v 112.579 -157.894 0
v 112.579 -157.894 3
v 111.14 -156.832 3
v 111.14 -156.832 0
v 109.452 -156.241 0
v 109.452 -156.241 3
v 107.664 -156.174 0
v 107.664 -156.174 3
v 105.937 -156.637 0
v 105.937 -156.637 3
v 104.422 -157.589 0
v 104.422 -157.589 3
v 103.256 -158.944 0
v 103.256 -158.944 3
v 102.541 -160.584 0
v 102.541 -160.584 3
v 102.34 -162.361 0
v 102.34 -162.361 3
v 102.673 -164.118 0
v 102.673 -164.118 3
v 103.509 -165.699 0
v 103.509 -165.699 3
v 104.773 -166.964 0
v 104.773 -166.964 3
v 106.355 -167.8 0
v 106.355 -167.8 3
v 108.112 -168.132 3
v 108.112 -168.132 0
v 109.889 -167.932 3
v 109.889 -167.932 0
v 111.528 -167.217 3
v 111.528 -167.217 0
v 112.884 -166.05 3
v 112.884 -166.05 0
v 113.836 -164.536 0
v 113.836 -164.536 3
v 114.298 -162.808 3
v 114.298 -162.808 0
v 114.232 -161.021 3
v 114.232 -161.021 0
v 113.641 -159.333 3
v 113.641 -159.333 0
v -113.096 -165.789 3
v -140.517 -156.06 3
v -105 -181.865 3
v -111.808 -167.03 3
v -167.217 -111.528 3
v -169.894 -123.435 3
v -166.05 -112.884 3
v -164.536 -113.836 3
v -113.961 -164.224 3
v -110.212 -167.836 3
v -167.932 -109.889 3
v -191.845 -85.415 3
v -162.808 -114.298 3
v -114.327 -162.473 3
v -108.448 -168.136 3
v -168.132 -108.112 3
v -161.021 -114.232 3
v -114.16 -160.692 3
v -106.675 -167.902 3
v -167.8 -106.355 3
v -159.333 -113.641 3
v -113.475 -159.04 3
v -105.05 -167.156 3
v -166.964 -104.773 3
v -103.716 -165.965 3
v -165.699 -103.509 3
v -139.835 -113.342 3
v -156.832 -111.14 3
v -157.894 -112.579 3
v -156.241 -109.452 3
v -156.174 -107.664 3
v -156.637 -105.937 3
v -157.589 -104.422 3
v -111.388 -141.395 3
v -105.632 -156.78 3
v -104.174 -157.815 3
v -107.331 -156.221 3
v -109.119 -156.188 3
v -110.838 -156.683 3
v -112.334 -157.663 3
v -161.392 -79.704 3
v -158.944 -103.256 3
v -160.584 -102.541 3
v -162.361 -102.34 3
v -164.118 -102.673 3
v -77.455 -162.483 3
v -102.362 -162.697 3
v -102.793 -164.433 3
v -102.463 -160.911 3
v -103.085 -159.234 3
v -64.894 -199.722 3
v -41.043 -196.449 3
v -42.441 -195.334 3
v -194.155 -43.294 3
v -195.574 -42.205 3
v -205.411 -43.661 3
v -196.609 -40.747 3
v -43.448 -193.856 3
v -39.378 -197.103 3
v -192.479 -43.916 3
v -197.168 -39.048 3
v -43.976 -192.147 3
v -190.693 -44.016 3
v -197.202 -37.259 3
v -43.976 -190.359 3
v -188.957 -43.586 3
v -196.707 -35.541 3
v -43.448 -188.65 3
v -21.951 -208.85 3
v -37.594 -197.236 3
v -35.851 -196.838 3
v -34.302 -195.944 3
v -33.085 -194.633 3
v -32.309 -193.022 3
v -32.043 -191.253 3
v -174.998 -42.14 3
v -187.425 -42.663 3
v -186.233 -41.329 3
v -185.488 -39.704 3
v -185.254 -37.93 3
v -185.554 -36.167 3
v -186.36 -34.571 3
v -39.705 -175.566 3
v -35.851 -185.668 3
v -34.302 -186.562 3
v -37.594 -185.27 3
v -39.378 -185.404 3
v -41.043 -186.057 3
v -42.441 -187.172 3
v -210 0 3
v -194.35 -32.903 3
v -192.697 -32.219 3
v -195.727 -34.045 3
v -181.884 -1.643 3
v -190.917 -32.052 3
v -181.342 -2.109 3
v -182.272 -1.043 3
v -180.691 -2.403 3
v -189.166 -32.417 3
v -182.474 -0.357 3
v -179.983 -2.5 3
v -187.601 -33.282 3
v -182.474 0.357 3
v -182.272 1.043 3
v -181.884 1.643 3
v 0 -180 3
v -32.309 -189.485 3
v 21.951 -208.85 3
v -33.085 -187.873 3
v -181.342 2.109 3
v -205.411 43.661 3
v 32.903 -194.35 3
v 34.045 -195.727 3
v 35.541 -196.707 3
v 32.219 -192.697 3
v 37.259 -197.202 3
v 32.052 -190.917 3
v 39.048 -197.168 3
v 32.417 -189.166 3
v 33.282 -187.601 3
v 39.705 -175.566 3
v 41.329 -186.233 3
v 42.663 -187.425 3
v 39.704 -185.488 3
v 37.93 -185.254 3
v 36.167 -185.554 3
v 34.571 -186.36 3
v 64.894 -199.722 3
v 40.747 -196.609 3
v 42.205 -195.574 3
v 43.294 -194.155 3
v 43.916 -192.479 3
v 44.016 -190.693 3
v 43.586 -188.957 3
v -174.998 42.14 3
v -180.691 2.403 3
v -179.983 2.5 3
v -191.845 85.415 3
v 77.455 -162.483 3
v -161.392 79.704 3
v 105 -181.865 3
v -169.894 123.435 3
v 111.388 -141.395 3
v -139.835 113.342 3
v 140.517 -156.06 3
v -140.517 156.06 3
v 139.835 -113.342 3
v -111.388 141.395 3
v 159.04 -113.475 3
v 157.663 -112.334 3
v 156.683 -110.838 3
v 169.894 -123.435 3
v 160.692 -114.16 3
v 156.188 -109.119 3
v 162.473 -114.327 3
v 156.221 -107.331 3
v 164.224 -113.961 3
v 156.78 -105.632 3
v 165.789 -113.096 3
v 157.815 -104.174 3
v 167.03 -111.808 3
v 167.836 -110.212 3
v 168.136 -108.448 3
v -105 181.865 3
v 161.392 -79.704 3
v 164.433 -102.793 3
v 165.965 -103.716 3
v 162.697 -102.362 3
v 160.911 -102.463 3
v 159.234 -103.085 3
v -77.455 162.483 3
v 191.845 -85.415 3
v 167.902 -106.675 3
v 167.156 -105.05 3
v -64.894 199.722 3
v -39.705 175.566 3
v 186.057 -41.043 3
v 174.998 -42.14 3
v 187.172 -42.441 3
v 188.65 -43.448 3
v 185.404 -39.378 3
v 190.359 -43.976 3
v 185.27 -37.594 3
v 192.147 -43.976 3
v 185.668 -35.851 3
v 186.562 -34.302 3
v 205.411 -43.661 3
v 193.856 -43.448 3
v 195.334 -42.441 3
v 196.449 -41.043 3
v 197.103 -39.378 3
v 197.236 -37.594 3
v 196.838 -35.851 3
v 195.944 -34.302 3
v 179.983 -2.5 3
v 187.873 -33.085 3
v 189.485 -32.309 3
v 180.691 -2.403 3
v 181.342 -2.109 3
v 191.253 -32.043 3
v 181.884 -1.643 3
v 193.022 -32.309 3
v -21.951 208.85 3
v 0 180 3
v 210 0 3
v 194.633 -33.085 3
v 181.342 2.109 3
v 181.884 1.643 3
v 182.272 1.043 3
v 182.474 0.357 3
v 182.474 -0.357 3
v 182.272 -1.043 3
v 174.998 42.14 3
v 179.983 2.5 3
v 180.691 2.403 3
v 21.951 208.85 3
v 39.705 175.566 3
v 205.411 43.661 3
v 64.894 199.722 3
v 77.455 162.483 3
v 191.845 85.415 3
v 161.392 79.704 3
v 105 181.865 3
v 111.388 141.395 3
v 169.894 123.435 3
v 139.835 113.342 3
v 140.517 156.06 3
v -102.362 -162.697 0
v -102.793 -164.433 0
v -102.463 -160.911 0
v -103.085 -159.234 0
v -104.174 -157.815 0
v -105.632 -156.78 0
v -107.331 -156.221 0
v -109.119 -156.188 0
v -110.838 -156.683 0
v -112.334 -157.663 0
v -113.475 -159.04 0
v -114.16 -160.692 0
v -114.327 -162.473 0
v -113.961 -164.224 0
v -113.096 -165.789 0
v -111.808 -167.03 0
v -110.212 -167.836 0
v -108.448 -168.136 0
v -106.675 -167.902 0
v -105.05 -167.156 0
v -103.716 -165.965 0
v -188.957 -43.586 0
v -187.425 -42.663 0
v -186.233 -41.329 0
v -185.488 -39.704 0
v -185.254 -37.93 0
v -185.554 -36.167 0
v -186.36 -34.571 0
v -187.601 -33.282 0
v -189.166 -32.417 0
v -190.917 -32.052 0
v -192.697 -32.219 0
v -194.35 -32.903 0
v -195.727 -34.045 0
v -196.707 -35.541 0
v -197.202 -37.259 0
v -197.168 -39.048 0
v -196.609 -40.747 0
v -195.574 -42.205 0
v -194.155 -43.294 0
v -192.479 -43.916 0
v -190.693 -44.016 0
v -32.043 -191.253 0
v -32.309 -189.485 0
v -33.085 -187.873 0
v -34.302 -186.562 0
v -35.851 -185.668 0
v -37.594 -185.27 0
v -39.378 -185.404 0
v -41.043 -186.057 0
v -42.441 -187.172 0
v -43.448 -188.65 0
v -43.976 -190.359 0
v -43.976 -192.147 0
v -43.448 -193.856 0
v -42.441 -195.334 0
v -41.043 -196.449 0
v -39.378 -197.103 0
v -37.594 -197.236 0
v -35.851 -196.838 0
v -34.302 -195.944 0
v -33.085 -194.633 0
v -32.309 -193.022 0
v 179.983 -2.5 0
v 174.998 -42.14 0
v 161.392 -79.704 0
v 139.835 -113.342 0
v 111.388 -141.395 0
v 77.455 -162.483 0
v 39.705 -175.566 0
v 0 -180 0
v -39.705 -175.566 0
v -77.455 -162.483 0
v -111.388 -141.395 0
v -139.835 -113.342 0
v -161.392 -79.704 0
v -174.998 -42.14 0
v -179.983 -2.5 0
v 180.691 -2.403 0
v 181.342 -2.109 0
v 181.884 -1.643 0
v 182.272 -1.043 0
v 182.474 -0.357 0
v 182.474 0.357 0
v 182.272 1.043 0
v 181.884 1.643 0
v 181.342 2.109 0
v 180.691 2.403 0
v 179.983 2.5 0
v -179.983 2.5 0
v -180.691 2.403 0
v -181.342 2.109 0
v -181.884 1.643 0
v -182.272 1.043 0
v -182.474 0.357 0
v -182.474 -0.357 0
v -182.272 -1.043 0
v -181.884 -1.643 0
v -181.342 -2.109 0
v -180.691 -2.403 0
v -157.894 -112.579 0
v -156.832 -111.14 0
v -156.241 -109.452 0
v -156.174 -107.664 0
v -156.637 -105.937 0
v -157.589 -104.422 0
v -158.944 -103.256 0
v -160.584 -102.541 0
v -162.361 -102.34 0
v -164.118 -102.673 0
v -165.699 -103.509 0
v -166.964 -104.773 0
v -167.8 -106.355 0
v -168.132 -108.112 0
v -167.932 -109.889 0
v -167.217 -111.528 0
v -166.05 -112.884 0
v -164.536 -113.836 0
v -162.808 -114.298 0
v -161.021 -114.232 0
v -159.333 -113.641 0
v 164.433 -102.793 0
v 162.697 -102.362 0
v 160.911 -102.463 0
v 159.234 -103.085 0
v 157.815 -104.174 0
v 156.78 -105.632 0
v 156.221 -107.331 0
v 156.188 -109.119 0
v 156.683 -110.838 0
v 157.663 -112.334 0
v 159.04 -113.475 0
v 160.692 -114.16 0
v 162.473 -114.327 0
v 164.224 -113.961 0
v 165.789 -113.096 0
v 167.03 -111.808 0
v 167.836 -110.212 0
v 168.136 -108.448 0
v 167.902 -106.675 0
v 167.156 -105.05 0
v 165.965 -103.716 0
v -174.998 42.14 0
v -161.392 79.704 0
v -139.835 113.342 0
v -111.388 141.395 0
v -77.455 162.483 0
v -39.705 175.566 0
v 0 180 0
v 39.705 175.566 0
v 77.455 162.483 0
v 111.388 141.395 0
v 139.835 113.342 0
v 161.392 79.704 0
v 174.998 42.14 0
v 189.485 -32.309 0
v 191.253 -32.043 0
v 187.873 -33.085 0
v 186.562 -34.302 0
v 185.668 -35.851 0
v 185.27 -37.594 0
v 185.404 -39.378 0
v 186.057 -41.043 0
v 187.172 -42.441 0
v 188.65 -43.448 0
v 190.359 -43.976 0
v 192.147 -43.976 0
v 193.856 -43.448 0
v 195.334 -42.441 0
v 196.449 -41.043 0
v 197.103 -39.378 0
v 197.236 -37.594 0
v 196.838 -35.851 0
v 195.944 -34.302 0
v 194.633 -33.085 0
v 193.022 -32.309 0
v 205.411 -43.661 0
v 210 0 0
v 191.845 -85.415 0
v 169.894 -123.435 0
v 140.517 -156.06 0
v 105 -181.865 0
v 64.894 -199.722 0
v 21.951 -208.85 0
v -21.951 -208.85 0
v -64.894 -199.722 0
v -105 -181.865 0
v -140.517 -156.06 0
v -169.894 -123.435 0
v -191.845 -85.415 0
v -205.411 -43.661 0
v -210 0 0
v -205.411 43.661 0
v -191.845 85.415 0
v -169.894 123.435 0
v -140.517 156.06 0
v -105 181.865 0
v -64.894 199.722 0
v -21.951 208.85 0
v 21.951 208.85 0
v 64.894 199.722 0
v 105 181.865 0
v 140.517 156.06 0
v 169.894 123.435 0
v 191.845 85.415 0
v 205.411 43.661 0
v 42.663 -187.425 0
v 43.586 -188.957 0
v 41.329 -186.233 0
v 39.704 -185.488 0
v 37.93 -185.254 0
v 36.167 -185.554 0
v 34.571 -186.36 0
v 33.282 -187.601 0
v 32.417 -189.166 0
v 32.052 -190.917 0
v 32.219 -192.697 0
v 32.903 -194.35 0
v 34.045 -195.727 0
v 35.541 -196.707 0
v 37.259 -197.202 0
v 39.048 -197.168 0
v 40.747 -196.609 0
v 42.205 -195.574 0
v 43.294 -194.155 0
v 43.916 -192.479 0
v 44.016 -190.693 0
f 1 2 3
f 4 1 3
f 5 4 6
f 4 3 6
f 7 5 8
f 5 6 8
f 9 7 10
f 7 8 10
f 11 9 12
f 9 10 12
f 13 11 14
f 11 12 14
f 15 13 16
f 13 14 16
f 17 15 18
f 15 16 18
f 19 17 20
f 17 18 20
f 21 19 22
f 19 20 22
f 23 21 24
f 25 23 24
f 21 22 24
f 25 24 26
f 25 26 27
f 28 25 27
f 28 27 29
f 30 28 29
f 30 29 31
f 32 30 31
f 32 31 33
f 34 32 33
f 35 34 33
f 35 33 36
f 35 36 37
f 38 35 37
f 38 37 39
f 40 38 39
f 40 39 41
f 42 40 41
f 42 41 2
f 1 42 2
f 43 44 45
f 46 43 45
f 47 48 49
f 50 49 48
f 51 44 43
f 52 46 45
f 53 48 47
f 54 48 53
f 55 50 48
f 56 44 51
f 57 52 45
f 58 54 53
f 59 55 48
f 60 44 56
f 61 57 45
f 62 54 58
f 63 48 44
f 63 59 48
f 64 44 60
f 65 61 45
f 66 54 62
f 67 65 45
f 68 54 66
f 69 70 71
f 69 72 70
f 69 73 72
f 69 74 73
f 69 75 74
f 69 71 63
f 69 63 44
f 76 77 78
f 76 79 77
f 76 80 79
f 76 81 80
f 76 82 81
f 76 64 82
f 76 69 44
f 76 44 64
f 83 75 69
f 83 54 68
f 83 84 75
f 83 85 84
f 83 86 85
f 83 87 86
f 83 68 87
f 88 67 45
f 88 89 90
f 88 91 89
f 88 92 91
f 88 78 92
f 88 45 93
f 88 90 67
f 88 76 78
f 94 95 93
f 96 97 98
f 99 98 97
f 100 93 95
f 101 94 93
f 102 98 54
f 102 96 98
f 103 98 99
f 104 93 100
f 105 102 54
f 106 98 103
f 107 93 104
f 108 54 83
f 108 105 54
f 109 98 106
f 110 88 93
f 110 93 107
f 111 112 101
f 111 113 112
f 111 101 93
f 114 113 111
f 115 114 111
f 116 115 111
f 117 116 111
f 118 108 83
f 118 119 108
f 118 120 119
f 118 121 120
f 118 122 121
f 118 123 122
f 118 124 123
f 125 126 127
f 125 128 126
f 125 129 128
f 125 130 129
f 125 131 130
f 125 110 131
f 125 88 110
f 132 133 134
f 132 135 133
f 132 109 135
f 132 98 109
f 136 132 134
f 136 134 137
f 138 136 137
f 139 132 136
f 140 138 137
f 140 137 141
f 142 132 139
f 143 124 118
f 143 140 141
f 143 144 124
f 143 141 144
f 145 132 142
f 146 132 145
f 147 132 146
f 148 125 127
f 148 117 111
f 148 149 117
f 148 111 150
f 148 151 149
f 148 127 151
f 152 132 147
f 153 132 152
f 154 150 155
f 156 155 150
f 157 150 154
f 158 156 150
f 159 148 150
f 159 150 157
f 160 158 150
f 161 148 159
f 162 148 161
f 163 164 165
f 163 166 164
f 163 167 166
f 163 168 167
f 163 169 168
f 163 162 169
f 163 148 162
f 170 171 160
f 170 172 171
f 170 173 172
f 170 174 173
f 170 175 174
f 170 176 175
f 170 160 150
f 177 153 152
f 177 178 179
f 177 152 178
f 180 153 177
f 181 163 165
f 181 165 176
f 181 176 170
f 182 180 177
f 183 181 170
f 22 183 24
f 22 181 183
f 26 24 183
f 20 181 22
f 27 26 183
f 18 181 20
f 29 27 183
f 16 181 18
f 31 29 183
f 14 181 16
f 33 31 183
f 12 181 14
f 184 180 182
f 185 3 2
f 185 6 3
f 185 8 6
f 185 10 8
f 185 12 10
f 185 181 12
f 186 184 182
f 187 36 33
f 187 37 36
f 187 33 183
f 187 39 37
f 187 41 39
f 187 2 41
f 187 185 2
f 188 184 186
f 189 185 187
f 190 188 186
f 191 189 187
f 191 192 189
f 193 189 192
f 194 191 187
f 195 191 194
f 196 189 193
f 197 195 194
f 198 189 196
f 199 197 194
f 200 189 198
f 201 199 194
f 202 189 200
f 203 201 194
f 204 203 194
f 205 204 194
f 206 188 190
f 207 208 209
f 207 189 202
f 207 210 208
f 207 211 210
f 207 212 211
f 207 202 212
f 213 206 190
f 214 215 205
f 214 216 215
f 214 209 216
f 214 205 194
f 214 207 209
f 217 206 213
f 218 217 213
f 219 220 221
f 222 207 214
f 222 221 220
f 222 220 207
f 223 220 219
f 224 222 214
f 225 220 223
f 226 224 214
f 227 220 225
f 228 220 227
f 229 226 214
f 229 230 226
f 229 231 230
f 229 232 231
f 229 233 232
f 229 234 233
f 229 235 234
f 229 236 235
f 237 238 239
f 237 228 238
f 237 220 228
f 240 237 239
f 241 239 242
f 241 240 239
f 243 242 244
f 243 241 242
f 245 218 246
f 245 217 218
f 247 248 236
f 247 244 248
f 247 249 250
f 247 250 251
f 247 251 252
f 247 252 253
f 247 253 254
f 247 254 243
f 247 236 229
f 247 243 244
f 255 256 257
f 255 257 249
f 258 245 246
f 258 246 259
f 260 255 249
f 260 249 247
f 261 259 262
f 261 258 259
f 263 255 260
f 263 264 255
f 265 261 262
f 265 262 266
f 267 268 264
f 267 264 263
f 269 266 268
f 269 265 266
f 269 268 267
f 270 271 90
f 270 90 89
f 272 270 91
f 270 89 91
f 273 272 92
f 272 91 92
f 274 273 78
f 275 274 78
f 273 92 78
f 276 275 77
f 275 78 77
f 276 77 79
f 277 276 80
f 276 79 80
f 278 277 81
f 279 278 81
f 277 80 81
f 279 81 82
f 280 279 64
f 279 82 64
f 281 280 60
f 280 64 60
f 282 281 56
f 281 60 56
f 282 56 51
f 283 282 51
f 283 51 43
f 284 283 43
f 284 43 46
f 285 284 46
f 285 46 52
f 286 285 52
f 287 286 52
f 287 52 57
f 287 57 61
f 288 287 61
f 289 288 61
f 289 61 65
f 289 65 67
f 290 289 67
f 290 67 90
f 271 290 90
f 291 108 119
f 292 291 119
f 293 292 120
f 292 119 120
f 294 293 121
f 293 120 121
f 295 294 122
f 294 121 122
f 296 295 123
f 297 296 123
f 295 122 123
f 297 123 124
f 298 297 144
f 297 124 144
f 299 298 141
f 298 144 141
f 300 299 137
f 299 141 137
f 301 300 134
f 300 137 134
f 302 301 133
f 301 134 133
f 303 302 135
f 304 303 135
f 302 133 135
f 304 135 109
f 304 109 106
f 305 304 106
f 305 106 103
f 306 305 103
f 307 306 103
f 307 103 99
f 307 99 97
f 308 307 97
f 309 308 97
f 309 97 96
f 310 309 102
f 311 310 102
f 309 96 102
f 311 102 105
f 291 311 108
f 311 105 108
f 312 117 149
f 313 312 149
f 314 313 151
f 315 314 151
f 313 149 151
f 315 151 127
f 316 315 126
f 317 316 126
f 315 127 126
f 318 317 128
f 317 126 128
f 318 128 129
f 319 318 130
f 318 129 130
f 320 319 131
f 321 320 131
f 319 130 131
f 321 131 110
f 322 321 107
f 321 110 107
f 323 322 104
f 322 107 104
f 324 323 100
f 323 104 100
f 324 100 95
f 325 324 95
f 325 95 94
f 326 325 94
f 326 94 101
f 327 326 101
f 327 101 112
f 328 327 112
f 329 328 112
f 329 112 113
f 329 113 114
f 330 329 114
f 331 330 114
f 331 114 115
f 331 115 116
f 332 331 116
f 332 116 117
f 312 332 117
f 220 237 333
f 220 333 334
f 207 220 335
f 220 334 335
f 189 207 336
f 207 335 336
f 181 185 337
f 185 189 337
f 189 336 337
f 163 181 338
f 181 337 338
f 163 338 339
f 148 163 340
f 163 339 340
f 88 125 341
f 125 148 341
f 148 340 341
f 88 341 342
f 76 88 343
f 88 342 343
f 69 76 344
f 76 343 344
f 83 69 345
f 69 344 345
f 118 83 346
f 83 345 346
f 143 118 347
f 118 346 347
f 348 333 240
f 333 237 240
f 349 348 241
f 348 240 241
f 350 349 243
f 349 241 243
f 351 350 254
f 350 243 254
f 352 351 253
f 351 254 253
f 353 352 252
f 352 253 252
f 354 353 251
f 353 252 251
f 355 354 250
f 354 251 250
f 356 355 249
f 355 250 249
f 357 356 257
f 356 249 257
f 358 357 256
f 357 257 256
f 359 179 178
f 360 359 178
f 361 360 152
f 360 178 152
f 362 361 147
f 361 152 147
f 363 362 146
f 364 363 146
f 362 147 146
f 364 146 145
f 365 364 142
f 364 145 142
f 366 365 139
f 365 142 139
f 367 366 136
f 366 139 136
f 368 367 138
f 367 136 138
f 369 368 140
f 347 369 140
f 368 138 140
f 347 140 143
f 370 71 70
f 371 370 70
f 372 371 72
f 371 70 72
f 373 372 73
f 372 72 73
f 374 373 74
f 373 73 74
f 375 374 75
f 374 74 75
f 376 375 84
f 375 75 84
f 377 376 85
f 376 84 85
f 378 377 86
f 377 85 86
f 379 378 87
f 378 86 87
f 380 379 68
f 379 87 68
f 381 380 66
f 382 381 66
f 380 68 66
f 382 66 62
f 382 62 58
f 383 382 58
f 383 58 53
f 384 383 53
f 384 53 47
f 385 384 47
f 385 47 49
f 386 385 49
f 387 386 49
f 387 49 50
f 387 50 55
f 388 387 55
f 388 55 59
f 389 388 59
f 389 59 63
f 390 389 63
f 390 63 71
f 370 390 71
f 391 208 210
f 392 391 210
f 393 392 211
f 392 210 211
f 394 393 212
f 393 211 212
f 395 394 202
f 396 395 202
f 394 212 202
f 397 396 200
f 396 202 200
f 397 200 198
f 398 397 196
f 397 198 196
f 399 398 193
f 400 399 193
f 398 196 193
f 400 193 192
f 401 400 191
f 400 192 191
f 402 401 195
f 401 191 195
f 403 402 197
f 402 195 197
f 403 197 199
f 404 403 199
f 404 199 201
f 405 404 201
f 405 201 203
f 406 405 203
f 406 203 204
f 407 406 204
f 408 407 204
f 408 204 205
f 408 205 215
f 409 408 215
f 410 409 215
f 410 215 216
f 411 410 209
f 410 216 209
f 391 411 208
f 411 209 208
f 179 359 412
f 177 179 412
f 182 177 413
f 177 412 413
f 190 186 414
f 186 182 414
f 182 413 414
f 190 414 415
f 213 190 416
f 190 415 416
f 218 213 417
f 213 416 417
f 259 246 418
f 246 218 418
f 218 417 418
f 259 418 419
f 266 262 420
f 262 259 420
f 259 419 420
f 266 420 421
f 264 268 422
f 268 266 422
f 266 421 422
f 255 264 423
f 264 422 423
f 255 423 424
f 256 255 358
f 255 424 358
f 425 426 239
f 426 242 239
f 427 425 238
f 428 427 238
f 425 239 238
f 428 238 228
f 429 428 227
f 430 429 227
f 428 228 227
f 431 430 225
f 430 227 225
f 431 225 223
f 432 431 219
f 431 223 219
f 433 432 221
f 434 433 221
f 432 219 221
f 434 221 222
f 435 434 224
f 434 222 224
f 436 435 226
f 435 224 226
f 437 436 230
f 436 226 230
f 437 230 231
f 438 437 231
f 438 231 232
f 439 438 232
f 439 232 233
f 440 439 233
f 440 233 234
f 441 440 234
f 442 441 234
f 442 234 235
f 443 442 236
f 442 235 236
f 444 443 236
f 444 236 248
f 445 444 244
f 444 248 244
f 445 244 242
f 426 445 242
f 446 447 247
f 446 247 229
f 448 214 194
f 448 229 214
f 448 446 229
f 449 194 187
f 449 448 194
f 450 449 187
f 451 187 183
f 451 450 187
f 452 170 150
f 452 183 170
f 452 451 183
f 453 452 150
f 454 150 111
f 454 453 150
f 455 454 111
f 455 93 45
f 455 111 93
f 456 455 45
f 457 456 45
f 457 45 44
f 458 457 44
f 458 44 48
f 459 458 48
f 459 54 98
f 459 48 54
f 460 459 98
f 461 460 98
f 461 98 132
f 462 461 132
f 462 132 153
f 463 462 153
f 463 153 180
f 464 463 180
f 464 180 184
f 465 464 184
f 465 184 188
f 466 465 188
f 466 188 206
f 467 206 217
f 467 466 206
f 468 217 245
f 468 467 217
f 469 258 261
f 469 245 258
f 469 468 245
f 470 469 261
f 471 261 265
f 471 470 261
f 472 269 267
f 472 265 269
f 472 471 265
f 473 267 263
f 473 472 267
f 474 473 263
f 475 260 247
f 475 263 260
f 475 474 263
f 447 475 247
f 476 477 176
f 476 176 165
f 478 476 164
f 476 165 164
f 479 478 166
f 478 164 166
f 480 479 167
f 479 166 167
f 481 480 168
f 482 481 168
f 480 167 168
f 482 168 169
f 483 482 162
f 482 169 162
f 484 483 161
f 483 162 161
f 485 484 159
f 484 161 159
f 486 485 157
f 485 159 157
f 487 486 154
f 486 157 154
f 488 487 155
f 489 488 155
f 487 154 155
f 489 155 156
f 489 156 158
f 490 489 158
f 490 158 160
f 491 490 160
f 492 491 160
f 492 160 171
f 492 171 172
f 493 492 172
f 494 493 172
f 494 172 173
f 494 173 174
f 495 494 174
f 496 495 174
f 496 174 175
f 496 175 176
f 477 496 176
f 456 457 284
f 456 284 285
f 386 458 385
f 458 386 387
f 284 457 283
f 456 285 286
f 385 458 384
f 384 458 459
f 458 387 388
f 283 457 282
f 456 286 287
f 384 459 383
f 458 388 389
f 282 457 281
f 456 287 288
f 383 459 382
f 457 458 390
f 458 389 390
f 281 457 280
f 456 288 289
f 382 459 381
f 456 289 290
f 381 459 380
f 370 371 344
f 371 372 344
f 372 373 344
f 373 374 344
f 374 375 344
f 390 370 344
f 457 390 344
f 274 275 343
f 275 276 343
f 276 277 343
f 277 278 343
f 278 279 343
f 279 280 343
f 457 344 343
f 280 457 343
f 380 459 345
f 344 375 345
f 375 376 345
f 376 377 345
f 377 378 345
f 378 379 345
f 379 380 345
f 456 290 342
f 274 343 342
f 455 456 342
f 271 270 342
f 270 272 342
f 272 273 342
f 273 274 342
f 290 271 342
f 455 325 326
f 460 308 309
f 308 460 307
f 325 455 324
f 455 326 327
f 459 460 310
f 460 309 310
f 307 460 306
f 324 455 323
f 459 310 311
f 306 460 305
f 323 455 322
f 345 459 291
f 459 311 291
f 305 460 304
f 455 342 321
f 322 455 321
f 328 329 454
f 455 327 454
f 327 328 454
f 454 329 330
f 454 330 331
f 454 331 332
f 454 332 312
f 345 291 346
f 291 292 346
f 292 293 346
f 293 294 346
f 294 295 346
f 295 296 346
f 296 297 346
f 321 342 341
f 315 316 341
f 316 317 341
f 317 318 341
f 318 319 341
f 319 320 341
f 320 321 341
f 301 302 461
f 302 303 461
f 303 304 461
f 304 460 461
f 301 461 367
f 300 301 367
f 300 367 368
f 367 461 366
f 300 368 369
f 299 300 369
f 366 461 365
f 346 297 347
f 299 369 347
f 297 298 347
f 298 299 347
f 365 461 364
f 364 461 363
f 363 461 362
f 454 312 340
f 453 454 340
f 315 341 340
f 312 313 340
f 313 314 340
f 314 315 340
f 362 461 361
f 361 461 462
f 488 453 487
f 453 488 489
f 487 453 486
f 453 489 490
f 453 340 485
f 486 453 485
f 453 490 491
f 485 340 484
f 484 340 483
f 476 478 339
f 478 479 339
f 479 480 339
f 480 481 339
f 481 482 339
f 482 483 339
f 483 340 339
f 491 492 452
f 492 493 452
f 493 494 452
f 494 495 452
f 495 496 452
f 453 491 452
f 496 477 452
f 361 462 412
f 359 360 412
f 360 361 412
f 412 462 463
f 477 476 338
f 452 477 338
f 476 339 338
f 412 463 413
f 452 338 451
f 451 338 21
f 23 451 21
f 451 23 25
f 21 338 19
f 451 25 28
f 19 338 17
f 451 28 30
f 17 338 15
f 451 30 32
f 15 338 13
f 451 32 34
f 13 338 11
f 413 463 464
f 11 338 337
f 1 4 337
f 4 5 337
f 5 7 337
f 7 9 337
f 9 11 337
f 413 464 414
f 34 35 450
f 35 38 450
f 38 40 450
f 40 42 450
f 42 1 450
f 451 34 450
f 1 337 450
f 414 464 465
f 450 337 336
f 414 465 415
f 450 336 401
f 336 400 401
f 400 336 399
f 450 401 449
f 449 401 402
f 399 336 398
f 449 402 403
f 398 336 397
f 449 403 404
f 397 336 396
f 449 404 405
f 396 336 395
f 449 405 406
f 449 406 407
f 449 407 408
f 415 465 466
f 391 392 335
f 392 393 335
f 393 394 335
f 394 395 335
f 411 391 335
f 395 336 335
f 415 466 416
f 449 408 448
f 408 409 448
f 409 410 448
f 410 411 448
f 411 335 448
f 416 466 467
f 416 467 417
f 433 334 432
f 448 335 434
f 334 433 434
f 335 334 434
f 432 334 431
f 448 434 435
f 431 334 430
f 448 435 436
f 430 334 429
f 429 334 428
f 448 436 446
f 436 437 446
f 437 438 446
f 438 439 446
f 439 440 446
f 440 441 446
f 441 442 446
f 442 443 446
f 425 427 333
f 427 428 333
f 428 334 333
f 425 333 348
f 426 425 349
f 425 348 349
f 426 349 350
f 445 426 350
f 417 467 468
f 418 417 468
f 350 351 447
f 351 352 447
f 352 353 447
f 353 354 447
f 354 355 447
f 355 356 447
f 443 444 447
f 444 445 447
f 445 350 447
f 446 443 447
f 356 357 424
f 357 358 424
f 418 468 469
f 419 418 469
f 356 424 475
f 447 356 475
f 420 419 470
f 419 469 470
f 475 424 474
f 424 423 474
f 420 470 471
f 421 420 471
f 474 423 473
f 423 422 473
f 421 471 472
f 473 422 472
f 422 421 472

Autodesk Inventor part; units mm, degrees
ref_plane "YZ Plane" through (0, 0, 0) normal (1, 0, 0) x (0, 1, 0)
ref_plane "XZ Plane" through (0, 0, 0) normal (0, 1, 0) x (-1, 0, 0)
ref_plane "XY Plane" through (0, 0, 0) normal (0, 0, 1) x (1, 0, 0)
sketch "Sketch1" plane through (0, 0, 0) normal (0, 0, 1) x (1, 0, 0)
  circle A0 centre (0, 0) radius 180
  circle A1 centre (0, 0) radius 210
  circle A2 centre (0, 0) radius 195 construction
  line L0 (0, 210) -> (0, 180) construction
  point P0 (0, 195)
  dimension "d9" = 390
  dimension "d11" = 30
extrude "Plate1" add sketch "Sketch1" along normal blind 3
sketch "Sketch2" plane through (0, 0, 3) normal (0, 0, 1) x (1, 0, 0)
  circle A0 centre (0, 0) radius 180 construction
  circle A1 centre (0, 0) radius 210 construction
  circle A2 centre (0, 0) radius 210 projected
  circle A3 centre (0, 0) radius 180 projected
  line L0 (0, 0) -> (0, -210) construction
  line L1 (0, 0) -> (-40.969, -205.9649) construction
  line L2 (-35.1163, -176.5414) -> (-40.969, -205.9649) construction
  circle A4 centre (-38.0426, -191.2531) radius 6
  dimension "d20" = 11.25
  dimension "d21" = 12
extrude "Extrusion1" cut sketch "Sketch2" against normal through all contours A4
pattern_circular "Circular Pattern1" count 8 over 157.5 about axis through (0, 0, 0) along (0, 0, 1) of "Extrusion1" both ways yes
sketch "Sketch3" plane through (0, 0, 3) normal (0, 0, 1) x (1, 0, 0)
  circle A0 centre (0, 0) radius 180 construction
  line L0 (180, 0) -> (-180, 0) construction
  circle A1 centre (180, 0) radius 2.5
  circle A2 centre (-180, 0) radius 2.5
  circle A3 centre (-161.2452, -80) radius 2.5
  line L1 (-161.2452, -80) -> (161.2452, -80) construction
  circle A4 centre (161.2452, -80) radius 2.5
  dimension "d27" = 5
  dimension "d29" = 80
extrude "Extrusion2" cut sketch "Sketch3" against normal through all contours A1 | A2
equation "\"d9\" = Шпил_пласт_НОС_диам_центров"
equation "\"d11\" = Шпил_пласт_НОС_ширина"
equation "\"d21\" = Шпил_пласт_НОС_диам_шпильки"
equation "\"d2\" = Thickness"
equation "\"BendRadius\" = Thickness"
equation "\"BendReliefWidth\" = Thickness"
equation "\"BendReliefDepth\" = 0.5 * Thickness"
equation "\"CornerReliefSize\" = 4 * Thickness"
equation "\"MinimumRemnant\" = 2 * Thickness"
equation "\"TransitionRadius\" = BendRadius"
equation "\"JacobiRadiusSize\" = BendRadius"
equation "\"GapSize\" = Thickness"
equation "\"Шпил_пласт_НОС_диам_центров\" = 390"
equation "\"Шпил_пласт_НОС_ширина\" = 30"
equation "\"Шпил_пласт_НОС_диам_шпильки\" = 12"
equation "\"Thickness\" = 3"
properties part number "ДМС 010 кольцо под шпильки"
